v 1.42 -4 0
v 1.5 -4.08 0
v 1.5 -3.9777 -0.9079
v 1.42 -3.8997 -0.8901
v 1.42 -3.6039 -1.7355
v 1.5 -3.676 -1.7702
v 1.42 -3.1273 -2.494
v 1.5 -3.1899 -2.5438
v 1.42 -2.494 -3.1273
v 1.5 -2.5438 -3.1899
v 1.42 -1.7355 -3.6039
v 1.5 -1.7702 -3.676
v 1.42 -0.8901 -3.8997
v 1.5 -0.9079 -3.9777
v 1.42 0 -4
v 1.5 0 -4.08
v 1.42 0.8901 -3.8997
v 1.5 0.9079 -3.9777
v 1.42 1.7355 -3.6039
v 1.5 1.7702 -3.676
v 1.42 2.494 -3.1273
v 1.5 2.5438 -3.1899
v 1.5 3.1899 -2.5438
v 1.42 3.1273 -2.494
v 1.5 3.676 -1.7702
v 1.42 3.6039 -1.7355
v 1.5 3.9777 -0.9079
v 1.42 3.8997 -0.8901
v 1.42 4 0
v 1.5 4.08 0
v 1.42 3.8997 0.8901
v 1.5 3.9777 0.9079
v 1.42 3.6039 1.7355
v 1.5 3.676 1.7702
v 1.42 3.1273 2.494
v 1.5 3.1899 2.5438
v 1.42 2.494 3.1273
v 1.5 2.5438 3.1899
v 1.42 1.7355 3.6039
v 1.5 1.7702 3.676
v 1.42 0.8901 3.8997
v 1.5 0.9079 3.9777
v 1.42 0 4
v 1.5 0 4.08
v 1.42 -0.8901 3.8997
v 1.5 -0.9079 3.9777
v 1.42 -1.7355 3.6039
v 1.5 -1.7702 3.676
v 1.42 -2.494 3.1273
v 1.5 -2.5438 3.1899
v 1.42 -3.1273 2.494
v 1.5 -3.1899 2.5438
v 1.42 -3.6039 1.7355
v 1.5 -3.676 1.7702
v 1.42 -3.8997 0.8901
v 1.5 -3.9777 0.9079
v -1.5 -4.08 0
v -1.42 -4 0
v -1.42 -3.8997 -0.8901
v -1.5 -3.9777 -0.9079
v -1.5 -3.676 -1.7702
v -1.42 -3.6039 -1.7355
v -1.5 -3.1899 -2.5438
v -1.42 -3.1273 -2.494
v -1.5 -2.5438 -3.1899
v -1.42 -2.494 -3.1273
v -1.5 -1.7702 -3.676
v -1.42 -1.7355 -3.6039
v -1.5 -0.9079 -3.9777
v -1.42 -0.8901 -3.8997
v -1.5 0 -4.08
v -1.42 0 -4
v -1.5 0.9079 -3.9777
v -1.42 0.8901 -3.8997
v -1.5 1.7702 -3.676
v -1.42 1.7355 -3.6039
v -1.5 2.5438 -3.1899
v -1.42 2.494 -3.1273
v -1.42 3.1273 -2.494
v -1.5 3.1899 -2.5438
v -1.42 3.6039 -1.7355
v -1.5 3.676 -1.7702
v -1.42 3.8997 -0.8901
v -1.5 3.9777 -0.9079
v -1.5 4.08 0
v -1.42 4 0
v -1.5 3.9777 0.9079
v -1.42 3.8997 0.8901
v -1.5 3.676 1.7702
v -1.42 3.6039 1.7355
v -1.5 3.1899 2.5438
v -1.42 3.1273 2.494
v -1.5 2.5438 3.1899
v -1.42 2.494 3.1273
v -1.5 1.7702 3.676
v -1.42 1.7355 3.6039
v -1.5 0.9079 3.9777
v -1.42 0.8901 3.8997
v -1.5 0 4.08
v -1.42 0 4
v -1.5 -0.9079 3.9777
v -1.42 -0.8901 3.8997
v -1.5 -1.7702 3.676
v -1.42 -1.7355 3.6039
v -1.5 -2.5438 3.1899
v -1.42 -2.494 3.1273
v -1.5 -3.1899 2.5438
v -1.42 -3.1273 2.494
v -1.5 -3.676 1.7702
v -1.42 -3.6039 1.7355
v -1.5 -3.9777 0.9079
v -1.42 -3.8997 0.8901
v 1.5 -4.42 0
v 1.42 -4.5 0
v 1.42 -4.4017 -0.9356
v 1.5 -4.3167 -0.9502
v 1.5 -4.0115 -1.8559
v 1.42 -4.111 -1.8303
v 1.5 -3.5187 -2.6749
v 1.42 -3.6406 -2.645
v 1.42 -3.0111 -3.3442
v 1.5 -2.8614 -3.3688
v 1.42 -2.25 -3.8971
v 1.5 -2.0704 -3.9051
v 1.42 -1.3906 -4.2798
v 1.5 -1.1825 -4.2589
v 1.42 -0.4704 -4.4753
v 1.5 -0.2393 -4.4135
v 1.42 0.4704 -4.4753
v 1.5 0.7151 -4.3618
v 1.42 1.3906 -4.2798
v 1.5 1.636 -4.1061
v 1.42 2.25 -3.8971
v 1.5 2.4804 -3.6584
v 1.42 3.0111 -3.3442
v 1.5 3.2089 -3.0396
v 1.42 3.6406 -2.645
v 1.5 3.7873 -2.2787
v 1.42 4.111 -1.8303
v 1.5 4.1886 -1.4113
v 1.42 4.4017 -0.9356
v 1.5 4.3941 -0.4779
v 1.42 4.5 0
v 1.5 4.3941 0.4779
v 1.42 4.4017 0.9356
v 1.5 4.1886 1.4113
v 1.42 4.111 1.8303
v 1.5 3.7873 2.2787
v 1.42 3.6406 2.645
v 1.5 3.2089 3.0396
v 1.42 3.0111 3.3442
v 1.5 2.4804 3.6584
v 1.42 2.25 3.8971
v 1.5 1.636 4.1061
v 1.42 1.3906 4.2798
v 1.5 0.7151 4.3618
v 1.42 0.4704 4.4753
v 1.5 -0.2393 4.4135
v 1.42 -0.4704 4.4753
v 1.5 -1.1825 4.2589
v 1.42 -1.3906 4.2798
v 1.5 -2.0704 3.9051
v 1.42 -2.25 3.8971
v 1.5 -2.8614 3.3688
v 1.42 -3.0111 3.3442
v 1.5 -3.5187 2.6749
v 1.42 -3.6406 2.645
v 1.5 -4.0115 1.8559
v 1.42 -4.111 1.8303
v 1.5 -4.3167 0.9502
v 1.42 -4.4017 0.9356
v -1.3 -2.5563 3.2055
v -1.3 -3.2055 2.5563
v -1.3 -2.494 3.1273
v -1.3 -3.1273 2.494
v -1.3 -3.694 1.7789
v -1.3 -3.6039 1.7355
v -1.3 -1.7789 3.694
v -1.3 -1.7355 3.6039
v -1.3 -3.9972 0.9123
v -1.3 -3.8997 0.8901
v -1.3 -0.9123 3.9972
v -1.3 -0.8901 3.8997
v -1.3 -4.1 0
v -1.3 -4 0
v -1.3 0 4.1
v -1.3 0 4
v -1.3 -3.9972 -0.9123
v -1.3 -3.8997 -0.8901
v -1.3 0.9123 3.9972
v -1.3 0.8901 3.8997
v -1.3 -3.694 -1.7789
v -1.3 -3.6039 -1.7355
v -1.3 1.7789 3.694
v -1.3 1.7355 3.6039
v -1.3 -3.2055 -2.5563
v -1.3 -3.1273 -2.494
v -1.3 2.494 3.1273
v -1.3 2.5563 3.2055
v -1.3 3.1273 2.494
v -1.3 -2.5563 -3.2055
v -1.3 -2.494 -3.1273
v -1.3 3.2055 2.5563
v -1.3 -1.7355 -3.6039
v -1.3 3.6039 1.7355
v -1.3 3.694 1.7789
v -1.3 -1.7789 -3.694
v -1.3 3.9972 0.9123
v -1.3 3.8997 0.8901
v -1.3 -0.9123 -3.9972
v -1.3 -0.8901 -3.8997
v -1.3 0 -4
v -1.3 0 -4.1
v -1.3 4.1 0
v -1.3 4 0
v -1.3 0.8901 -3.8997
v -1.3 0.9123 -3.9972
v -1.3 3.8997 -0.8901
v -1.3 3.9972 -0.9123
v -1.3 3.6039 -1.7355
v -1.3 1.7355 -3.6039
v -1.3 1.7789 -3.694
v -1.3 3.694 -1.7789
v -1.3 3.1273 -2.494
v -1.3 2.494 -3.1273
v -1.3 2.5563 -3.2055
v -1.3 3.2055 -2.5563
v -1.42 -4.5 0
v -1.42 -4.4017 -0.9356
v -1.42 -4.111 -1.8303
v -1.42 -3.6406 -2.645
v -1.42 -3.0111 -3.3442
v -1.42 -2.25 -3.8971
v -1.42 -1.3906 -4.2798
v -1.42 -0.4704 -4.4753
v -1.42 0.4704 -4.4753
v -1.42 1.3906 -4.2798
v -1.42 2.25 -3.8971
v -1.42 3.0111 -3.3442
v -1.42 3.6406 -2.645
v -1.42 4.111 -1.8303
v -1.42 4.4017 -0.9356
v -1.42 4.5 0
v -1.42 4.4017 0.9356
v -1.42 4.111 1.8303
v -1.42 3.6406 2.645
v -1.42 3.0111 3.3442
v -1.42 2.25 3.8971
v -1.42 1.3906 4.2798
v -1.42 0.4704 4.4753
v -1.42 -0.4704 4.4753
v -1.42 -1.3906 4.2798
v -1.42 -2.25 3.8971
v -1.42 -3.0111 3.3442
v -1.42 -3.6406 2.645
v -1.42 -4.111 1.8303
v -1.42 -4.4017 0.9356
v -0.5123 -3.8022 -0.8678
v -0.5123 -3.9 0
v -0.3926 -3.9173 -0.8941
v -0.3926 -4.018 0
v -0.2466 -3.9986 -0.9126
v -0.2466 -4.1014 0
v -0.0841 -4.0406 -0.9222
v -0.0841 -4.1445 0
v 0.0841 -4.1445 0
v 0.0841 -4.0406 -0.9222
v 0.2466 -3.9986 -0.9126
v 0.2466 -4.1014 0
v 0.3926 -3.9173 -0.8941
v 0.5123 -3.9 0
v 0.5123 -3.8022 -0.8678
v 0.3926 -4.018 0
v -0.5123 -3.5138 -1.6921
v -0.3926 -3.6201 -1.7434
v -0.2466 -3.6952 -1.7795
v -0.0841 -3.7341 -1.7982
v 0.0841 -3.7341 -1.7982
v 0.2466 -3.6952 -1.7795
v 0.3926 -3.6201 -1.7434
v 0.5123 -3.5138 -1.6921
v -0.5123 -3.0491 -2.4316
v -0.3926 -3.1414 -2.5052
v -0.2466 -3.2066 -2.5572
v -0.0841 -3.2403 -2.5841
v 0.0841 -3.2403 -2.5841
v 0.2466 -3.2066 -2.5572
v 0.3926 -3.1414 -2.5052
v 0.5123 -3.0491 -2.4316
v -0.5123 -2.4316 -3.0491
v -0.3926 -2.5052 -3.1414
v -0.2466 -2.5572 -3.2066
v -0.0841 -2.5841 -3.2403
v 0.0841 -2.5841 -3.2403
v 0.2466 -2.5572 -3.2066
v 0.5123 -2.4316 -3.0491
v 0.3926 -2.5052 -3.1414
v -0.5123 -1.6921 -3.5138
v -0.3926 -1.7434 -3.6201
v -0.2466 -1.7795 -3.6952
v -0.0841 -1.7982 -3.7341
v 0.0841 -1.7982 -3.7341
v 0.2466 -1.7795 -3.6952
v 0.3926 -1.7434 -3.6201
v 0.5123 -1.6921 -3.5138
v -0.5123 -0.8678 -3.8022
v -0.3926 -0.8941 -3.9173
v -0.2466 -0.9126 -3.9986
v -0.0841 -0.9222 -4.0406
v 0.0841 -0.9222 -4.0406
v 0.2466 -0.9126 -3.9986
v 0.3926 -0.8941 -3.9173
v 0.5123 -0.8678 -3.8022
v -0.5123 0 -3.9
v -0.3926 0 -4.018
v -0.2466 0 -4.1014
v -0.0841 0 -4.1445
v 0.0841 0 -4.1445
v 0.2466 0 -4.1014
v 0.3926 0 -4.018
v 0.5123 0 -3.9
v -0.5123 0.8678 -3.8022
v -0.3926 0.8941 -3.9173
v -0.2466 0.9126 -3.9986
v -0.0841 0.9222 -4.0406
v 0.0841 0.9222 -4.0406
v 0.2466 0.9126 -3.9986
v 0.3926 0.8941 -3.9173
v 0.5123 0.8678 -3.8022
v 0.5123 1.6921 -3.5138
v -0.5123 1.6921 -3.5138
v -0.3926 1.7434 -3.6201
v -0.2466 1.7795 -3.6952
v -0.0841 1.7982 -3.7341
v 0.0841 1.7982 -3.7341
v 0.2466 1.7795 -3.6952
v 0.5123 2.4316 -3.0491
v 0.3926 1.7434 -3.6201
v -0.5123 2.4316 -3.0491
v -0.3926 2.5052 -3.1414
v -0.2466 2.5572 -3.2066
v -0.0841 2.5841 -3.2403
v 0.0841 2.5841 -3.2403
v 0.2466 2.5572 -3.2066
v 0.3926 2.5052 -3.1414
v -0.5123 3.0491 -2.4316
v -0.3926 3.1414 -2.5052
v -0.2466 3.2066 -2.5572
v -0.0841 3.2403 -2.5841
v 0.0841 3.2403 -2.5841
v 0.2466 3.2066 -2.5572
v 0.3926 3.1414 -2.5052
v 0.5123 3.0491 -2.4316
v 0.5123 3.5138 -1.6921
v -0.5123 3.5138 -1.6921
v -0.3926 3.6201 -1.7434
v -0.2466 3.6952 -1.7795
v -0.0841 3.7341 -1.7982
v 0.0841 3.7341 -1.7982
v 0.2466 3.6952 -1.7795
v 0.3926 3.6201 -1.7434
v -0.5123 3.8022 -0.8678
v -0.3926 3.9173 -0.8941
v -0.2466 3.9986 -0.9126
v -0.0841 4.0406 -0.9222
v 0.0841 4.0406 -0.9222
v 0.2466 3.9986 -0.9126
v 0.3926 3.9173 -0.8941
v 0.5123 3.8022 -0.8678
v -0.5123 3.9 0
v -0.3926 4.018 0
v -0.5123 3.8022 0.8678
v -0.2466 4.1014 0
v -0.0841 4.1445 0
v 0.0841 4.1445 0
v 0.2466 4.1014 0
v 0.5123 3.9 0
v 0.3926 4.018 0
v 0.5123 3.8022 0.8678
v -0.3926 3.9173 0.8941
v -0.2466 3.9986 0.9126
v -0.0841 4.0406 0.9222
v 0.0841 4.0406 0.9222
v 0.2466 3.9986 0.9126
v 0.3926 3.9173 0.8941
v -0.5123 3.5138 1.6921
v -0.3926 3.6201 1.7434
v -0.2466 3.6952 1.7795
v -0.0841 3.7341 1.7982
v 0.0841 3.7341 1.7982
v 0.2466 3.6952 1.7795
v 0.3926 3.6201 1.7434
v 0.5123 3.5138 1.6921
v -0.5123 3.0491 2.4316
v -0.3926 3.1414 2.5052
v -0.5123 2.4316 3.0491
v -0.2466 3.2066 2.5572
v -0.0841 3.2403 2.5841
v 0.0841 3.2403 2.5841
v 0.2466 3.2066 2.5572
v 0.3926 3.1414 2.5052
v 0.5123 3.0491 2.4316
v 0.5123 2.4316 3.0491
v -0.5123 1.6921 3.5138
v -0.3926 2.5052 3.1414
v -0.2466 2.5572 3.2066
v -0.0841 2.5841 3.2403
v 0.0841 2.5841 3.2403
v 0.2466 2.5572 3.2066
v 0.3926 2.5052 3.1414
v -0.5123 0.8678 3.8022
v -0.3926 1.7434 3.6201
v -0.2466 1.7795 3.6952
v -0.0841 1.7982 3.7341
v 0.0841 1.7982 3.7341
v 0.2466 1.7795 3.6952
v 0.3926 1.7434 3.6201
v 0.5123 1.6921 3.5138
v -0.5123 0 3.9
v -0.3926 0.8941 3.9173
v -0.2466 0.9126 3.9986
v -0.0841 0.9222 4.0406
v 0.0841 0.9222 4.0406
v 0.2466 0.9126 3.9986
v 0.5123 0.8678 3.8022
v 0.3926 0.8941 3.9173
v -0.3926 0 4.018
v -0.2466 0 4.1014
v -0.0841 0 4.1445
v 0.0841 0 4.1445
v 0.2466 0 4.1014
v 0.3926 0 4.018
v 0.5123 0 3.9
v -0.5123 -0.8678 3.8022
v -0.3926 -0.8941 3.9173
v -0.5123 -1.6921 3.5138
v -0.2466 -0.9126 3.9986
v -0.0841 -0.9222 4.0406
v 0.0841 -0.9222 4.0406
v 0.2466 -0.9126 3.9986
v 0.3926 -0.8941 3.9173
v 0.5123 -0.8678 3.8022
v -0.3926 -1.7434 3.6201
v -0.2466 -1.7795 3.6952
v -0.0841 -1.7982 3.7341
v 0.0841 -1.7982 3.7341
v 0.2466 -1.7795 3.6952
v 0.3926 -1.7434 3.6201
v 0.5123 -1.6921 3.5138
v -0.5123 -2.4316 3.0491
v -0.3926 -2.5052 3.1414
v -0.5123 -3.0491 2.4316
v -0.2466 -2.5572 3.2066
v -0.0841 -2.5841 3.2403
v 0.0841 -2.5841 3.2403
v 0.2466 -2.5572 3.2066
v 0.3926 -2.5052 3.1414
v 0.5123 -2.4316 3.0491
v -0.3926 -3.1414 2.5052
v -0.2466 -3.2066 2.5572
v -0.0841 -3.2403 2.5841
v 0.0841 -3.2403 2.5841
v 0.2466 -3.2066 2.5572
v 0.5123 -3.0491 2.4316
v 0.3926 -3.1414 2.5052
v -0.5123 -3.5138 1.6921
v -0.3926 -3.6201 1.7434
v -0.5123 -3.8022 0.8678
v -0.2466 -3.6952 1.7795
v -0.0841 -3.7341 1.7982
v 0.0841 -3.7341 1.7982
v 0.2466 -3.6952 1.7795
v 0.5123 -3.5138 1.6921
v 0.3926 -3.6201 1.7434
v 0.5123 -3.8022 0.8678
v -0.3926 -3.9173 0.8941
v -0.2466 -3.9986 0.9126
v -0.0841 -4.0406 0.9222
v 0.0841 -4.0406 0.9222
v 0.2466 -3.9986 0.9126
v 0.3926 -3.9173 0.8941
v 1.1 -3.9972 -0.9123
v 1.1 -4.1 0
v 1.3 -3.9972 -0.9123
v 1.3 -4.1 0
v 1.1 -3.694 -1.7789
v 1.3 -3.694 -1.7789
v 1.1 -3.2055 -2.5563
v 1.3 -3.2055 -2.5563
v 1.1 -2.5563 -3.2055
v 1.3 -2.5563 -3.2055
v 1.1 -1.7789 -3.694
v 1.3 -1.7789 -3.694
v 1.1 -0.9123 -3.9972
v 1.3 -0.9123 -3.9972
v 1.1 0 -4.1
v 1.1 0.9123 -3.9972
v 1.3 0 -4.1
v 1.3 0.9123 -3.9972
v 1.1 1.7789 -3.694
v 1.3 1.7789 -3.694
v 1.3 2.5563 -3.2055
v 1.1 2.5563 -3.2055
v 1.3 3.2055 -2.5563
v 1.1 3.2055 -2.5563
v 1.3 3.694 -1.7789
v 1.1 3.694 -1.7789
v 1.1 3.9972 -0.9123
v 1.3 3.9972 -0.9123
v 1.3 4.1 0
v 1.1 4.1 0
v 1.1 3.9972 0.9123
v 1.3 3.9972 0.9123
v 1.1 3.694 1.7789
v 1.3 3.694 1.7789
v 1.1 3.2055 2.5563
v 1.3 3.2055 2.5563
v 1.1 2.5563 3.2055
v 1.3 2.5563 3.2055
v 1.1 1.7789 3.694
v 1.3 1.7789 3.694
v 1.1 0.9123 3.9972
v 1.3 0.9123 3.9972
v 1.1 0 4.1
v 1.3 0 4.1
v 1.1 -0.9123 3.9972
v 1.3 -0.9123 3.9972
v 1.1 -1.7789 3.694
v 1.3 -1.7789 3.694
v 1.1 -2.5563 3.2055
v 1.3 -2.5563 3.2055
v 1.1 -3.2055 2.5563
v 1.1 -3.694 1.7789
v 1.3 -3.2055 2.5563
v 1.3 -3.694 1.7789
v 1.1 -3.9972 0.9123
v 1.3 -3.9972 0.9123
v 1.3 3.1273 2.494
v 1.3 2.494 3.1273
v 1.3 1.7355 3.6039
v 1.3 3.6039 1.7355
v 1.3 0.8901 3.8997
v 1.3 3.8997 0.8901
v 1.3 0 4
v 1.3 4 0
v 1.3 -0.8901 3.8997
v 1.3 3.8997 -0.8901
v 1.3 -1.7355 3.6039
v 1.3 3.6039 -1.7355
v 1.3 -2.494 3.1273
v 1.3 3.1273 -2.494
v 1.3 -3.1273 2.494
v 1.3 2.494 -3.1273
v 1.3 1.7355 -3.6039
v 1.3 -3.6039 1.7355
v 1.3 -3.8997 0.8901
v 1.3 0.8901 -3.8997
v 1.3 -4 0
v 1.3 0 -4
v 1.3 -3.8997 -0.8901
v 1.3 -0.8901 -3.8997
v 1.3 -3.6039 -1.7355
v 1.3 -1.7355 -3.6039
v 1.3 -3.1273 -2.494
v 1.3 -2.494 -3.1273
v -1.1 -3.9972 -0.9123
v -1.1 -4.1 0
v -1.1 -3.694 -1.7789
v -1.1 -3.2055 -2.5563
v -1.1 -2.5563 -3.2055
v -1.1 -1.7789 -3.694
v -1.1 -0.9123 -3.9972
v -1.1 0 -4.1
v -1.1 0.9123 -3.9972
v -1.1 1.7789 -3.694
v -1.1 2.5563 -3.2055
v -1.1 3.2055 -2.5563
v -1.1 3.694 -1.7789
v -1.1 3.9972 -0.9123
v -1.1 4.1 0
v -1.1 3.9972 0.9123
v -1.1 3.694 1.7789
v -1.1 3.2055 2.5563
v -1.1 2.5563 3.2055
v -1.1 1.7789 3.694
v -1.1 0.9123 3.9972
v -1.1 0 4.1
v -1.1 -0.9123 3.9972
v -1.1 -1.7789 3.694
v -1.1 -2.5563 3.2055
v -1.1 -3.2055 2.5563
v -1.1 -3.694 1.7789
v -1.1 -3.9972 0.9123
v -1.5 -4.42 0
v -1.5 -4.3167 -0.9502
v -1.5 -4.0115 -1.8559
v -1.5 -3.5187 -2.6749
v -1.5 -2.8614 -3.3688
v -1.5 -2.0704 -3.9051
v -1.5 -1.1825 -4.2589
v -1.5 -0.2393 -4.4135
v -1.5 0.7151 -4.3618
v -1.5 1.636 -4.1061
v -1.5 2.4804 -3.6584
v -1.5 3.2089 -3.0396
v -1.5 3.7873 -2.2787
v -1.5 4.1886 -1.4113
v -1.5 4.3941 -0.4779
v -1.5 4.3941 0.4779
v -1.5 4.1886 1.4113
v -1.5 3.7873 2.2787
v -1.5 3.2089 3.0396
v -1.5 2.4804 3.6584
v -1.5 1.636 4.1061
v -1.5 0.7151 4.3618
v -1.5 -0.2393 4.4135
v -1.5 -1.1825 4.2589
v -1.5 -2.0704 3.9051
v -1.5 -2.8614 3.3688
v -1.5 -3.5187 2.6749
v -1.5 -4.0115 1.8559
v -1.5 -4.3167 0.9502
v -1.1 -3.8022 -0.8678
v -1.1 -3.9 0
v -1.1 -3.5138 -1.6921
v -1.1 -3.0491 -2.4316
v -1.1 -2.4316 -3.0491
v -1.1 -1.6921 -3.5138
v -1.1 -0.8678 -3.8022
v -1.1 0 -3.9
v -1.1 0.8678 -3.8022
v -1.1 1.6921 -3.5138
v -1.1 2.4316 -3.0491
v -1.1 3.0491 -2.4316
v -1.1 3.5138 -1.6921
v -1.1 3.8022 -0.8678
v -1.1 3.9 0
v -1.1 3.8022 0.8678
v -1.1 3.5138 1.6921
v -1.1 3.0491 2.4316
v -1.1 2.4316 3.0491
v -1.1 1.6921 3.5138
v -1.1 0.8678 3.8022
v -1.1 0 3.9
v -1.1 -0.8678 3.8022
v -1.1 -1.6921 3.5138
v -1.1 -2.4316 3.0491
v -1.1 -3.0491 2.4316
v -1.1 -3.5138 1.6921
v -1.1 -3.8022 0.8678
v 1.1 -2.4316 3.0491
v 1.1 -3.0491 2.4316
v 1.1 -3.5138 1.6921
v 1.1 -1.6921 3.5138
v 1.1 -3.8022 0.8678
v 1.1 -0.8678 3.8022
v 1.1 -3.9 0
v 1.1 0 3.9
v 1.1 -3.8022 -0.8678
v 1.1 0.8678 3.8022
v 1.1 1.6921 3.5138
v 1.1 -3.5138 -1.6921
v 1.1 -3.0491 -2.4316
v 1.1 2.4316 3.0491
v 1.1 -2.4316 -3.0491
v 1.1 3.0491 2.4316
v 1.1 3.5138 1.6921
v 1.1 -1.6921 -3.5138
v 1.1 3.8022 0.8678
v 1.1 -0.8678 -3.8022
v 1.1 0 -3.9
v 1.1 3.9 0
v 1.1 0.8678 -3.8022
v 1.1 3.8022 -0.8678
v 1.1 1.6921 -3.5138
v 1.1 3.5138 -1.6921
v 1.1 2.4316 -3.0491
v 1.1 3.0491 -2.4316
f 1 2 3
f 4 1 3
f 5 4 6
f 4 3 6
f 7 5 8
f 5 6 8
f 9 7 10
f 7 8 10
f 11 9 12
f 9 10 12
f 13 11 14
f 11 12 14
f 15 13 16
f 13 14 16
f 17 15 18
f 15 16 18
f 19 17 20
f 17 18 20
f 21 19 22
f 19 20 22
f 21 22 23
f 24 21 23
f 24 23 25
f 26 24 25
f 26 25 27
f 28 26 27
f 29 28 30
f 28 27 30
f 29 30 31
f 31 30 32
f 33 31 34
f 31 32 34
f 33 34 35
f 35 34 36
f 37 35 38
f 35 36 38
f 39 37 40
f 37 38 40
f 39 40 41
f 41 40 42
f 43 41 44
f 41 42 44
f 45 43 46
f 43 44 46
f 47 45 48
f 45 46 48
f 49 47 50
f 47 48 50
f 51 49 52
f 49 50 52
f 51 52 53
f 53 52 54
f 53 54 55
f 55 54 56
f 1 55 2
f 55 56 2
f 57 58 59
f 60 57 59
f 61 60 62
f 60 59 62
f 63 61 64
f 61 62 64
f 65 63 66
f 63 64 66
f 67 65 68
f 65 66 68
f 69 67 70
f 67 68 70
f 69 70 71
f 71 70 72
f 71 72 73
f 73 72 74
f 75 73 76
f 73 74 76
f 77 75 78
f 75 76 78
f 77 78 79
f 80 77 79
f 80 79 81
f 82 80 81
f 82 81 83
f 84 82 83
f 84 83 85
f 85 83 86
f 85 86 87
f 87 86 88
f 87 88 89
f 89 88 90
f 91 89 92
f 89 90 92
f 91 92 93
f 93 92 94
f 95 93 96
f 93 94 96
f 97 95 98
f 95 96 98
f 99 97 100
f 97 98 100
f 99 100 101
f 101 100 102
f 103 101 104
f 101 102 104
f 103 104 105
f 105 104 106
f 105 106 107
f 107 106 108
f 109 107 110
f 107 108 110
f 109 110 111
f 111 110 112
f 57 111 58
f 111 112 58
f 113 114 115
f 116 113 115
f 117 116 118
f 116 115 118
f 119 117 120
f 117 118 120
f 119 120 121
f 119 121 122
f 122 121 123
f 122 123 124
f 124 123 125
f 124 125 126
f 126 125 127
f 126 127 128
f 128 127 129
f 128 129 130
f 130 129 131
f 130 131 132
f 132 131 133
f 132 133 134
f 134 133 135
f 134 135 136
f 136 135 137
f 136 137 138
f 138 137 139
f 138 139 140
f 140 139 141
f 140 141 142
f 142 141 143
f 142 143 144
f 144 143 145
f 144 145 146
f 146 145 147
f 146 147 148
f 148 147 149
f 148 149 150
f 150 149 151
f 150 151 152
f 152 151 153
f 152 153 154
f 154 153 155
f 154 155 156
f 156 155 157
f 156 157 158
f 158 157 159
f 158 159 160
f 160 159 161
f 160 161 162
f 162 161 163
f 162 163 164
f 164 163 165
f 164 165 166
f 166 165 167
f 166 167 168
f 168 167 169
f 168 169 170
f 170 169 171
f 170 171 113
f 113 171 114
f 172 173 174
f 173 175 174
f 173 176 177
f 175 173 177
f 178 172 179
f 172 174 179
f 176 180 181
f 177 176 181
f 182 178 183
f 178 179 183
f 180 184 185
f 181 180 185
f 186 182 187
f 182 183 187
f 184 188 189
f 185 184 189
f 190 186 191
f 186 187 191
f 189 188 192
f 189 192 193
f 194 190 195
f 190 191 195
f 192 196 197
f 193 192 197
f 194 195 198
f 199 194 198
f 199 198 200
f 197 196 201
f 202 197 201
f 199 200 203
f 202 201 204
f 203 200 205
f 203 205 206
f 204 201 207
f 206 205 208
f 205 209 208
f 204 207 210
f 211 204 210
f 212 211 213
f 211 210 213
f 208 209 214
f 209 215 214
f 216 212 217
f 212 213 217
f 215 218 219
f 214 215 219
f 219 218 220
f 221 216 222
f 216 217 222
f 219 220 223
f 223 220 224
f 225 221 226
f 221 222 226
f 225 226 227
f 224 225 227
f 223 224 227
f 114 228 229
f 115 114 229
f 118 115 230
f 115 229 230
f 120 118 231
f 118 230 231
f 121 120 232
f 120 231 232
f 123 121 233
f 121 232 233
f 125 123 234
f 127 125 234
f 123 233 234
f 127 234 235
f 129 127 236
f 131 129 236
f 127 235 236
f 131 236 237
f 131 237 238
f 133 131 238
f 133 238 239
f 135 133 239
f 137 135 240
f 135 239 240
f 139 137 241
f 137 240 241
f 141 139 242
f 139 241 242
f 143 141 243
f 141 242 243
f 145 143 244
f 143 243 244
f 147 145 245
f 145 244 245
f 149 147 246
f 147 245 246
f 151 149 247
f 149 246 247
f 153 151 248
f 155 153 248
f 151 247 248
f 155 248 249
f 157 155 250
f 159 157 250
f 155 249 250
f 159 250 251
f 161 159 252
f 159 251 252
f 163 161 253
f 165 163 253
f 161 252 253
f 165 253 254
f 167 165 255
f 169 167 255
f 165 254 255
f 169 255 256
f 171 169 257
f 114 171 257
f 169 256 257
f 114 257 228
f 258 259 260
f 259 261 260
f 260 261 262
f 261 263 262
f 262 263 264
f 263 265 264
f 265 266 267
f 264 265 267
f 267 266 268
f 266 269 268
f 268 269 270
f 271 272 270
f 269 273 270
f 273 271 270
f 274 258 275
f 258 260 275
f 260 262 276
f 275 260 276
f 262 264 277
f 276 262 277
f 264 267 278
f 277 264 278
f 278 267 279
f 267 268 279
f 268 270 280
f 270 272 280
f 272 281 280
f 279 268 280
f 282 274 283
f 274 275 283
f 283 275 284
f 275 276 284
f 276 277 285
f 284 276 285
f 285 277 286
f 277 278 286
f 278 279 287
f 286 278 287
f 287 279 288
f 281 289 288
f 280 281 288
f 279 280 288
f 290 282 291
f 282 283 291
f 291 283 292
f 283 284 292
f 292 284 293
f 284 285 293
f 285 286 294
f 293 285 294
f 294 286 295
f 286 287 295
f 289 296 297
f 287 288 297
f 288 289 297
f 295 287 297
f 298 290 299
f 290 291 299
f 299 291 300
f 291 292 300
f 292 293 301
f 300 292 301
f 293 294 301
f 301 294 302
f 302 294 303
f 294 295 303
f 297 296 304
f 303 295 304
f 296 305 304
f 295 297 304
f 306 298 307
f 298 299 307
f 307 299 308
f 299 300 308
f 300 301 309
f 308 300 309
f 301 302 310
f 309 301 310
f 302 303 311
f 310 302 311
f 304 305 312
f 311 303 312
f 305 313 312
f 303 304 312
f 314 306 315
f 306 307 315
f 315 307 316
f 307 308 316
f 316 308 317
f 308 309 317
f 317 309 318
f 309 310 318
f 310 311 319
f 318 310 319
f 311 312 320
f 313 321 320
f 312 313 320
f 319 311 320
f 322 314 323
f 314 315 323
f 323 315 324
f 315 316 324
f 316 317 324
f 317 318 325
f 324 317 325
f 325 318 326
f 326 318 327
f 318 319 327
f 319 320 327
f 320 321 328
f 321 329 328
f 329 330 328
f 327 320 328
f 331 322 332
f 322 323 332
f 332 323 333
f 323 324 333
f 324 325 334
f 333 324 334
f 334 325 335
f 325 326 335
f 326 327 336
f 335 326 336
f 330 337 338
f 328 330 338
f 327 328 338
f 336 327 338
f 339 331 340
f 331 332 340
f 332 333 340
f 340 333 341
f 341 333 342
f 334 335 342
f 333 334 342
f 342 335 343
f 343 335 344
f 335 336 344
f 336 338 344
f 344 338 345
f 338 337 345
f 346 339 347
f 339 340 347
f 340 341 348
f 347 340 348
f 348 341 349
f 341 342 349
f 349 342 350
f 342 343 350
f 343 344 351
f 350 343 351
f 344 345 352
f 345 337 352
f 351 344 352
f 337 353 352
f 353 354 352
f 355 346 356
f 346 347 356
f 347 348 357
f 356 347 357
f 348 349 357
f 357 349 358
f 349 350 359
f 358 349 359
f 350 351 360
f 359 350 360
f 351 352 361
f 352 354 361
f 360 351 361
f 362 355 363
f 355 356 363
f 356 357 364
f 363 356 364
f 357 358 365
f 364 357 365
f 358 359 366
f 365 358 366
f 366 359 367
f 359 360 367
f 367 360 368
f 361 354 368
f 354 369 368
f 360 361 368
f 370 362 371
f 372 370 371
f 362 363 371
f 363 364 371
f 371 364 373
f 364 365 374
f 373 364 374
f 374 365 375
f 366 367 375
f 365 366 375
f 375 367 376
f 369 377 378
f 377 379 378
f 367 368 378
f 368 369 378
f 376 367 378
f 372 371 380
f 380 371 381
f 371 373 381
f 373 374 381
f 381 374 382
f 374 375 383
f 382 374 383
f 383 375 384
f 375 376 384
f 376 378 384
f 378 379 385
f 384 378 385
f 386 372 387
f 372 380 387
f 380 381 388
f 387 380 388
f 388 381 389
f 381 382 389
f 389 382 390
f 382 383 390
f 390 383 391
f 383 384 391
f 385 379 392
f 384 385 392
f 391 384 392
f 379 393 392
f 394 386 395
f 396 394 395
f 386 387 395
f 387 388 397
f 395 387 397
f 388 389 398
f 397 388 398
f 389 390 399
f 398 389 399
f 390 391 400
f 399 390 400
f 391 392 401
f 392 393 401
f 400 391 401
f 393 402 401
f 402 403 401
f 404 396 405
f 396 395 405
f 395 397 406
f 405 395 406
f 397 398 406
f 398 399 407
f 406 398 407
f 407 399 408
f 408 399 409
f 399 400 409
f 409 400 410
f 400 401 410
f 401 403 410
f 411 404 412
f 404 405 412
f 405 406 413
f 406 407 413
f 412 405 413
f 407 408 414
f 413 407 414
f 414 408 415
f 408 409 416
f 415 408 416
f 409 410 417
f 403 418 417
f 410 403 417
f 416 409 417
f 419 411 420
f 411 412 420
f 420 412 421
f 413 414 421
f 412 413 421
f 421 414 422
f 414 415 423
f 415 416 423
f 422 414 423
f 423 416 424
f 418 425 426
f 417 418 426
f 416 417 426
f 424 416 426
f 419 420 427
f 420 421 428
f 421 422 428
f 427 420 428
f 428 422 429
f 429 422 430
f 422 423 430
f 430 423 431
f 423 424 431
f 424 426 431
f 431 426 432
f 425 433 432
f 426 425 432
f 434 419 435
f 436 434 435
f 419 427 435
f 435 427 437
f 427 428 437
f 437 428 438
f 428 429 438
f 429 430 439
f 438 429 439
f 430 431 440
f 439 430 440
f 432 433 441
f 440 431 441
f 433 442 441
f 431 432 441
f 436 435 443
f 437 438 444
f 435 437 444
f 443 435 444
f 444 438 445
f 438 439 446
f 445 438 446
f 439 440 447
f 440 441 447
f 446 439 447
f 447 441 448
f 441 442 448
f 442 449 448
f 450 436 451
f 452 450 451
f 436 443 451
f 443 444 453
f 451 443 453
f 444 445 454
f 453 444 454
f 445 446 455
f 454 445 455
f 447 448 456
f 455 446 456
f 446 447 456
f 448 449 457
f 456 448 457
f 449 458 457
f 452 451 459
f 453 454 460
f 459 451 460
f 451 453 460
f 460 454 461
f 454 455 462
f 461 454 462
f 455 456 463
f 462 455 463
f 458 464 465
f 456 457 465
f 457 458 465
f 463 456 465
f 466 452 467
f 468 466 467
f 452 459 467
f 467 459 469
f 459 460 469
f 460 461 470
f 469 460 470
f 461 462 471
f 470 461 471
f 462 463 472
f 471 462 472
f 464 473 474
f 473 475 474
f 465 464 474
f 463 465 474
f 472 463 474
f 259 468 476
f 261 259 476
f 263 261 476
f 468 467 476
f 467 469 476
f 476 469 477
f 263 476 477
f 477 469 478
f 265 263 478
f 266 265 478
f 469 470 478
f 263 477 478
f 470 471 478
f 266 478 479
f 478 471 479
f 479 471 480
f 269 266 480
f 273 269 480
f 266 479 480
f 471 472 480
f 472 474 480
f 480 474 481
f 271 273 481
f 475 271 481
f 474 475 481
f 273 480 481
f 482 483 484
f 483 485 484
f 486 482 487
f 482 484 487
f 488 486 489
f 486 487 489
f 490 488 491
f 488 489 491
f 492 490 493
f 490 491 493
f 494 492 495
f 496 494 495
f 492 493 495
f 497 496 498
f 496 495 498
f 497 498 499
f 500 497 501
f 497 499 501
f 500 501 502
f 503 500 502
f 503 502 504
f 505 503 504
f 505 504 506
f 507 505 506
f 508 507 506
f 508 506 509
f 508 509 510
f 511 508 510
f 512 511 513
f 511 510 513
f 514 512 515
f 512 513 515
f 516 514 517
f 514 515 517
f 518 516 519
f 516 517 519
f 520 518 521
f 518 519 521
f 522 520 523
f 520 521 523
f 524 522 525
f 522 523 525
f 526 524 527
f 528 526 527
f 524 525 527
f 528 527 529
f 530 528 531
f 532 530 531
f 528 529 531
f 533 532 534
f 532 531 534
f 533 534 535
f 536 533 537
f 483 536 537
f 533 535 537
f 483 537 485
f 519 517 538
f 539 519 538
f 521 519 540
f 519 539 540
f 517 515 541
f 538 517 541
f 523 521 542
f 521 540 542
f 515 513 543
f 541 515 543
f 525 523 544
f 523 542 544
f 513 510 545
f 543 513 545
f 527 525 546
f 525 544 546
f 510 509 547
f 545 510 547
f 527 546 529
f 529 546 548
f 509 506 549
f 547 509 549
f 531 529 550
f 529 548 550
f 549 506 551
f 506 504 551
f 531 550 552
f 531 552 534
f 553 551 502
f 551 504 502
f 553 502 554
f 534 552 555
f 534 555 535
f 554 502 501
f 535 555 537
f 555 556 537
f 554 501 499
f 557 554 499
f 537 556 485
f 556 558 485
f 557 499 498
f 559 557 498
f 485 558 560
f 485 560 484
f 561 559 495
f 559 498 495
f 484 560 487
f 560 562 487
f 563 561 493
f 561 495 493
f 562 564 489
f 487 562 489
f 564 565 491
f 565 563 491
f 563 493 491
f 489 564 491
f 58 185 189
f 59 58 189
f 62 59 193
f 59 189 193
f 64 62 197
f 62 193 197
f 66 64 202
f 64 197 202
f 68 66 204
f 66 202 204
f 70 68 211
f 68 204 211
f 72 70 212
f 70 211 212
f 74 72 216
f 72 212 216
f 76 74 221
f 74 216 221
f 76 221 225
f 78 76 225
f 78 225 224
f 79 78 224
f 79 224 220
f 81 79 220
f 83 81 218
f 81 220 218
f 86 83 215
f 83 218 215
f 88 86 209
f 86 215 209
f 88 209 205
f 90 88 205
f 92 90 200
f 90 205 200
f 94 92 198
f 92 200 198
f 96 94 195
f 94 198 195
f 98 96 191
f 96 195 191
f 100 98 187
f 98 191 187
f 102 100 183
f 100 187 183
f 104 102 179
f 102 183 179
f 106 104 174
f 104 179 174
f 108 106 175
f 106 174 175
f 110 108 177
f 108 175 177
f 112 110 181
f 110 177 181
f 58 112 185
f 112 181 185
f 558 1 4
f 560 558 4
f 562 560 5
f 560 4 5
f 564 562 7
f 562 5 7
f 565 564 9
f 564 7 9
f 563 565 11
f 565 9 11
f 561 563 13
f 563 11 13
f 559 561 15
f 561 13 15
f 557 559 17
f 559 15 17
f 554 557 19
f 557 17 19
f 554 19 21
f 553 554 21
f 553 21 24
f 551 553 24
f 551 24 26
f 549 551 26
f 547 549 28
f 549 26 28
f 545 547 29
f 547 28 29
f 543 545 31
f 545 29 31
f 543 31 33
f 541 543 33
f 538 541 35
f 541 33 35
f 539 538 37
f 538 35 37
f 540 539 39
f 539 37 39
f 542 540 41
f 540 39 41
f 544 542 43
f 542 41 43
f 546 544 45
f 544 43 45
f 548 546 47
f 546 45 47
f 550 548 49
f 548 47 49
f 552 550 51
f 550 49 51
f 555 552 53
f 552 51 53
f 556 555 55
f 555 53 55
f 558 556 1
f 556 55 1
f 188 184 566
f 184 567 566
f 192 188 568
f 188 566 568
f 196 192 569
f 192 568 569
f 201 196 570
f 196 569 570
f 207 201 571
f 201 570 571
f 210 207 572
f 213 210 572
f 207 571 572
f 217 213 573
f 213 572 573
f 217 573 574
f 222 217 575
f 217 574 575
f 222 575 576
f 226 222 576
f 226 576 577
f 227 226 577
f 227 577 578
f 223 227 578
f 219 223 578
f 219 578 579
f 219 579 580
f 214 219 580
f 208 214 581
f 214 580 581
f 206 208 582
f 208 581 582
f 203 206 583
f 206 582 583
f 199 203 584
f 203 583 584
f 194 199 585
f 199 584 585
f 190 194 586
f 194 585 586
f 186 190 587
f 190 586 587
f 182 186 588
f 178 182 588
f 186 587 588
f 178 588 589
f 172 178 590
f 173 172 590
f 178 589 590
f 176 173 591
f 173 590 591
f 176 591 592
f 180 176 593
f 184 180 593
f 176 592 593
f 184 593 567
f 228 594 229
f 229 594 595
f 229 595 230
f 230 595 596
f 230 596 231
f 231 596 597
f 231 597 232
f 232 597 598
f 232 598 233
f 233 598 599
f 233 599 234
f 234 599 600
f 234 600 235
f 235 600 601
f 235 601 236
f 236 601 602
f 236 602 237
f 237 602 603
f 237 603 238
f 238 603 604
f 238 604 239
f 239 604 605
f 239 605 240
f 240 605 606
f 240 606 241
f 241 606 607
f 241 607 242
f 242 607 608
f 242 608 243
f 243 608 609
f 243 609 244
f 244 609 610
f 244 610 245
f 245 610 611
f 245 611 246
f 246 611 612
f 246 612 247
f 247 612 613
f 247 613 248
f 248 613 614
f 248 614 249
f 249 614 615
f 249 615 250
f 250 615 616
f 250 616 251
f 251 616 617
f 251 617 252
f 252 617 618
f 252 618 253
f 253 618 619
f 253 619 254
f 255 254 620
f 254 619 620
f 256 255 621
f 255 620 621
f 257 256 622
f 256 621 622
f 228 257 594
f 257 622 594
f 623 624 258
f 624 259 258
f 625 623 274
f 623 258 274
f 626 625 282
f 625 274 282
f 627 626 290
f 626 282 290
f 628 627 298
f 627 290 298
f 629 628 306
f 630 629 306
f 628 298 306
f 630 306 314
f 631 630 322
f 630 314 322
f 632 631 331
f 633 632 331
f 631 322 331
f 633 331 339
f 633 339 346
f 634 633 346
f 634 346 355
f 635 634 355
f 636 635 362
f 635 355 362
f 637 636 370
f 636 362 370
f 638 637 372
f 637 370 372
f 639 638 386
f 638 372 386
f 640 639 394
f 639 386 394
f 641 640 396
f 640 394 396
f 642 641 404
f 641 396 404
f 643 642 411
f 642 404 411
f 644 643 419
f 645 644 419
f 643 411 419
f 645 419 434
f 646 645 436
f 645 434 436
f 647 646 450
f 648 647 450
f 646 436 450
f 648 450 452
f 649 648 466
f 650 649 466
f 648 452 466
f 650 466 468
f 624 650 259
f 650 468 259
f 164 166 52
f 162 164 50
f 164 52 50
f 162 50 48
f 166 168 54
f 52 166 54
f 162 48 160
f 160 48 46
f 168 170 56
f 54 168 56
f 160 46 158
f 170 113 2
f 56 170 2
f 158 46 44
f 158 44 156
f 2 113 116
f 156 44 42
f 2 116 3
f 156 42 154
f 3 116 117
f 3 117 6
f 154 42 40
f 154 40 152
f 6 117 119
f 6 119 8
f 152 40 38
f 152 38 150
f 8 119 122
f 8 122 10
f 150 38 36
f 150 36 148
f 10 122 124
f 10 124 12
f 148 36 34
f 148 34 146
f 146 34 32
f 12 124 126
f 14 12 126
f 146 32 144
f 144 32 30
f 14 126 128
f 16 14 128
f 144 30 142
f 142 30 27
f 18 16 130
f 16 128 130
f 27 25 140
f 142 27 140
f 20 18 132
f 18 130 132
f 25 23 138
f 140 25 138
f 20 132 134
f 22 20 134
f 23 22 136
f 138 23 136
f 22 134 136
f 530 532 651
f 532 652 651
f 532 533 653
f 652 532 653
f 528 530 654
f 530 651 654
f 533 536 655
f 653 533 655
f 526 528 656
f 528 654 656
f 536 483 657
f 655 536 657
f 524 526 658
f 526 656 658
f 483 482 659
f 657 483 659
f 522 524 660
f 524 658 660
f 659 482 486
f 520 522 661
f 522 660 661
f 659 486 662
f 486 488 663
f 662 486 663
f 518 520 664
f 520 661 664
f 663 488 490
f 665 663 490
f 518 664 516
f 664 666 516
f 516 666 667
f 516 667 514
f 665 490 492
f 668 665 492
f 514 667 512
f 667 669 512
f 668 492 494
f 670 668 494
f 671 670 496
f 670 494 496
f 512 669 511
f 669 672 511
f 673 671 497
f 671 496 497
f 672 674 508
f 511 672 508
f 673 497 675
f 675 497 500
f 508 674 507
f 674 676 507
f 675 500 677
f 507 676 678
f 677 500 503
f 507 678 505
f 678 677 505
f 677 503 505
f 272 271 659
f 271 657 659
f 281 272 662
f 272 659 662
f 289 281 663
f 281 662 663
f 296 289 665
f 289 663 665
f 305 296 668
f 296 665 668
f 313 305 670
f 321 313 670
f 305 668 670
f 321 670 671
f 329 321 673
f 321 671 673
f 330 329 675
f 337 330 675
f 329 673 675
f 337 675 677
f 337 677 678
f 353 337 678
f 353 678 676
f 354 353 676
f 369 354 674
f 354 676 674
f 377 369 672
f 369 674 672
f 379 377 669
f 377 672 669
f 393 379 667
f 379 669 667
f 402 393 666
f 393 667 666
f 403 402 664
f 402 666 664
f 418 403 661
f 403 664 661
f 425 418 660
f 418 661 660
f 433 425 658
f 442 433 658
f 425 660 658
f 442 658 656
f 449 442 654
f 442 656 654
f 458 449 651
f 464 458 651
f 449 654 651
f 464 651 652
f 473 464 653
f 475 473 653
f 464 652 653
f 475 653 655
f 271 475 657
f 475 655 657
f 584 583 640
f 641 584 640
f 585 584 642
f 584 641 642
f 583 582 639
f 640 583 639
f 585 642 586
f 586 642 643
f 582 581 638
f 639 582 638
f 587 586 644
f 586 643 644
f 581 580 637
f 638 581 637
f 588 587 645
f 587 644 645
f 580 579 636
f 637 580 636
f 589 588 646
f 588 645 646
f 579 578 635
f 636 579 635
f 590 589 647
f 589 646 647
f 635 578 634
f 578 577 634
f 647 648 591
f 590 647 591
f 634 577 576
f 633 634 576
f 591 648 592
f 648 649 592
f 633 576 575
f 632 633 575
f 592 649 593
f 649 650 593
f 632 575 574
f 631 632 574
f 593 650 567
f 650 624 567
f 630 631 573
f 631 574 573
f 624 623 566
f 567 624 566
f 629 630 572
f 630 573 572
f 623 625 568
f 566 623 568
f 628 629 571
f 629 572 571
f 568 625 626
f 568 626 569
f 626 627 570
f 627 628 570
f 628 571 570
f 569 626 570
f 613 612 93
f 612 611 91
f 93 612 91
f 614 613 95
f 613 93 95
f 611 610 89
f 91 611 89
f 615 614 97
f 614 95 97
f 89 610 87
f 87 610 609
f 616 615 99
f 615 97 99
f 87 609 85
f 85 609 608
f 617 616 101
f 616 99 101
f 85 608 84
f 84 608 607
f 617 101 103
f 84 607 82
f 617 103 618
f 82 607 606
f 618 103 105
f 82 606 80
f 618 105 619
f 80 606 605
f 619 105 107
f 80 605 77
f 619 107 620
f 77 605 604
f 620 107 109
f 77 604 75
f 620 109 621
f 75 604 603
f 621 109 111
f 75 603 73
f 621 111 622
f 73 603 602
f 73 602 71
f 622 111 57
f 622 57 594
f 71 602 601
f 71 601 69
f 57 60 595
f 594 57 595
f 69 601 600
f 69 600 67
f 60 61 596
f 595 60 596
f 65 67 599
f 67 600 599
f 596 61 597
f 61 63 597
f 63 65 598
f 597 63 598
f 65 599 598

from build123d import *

# Parameters (mm, degrees)
CHAMFER1_SIZE = 0.08


with BuildPart() as part:
    # Sketch1 → Revolve1 (revolve)
    with BuildSketch(Plane.XY):
        with BuildLine():
            Line((-1.1, -3.9), (-0.512347538, -3.9))
            ThreePointArc((-0.512347538, -3.9), (0, -4.15), (0.512347538, -3.9))
            Line((0.512347538, -3.9), (1.1, -3.9))
            Line((1.1, -3.9), (1.1, -4.1))
            Line((1.1, -4.1), (1.3, -4.1))
            Line((1.3, -4.1), (1.3, -4))
            Line((1.3, -4), (1.5, -4))
            Line((1.5, -4), (1.5, -4.5))
            Line((1.5, -4.5), (-1.5, -4.5))
            Line((-1.5, -4.5), (-1.5, -4))
            Line((-1.5, -4), (-1.3, -4))
            Line((-1.3, -4), (-1.3, -4.1))
            Line((-1.3, -4.1), (-1.1, -4.1))
            Line((-1.1, -4.1), (-1.1, -3.9))
        make_face()
    revolve(axis=Axis((-6.429017492, 0, 0), (1, 0, 0)))

    # Chamfer1
    chamfer1_edges = [part.edges().sort_by_distance(p)[0] for p in [
        (1.5, 4.5, 0),
        (-1.5, 4.5, 0),
        (-1.5, 4, 0),
        (1.5, 4, 0),
    ]]
    chamfer(chamfer1_edges, length=CHAMFER1_SIZE)


solid = part.part
